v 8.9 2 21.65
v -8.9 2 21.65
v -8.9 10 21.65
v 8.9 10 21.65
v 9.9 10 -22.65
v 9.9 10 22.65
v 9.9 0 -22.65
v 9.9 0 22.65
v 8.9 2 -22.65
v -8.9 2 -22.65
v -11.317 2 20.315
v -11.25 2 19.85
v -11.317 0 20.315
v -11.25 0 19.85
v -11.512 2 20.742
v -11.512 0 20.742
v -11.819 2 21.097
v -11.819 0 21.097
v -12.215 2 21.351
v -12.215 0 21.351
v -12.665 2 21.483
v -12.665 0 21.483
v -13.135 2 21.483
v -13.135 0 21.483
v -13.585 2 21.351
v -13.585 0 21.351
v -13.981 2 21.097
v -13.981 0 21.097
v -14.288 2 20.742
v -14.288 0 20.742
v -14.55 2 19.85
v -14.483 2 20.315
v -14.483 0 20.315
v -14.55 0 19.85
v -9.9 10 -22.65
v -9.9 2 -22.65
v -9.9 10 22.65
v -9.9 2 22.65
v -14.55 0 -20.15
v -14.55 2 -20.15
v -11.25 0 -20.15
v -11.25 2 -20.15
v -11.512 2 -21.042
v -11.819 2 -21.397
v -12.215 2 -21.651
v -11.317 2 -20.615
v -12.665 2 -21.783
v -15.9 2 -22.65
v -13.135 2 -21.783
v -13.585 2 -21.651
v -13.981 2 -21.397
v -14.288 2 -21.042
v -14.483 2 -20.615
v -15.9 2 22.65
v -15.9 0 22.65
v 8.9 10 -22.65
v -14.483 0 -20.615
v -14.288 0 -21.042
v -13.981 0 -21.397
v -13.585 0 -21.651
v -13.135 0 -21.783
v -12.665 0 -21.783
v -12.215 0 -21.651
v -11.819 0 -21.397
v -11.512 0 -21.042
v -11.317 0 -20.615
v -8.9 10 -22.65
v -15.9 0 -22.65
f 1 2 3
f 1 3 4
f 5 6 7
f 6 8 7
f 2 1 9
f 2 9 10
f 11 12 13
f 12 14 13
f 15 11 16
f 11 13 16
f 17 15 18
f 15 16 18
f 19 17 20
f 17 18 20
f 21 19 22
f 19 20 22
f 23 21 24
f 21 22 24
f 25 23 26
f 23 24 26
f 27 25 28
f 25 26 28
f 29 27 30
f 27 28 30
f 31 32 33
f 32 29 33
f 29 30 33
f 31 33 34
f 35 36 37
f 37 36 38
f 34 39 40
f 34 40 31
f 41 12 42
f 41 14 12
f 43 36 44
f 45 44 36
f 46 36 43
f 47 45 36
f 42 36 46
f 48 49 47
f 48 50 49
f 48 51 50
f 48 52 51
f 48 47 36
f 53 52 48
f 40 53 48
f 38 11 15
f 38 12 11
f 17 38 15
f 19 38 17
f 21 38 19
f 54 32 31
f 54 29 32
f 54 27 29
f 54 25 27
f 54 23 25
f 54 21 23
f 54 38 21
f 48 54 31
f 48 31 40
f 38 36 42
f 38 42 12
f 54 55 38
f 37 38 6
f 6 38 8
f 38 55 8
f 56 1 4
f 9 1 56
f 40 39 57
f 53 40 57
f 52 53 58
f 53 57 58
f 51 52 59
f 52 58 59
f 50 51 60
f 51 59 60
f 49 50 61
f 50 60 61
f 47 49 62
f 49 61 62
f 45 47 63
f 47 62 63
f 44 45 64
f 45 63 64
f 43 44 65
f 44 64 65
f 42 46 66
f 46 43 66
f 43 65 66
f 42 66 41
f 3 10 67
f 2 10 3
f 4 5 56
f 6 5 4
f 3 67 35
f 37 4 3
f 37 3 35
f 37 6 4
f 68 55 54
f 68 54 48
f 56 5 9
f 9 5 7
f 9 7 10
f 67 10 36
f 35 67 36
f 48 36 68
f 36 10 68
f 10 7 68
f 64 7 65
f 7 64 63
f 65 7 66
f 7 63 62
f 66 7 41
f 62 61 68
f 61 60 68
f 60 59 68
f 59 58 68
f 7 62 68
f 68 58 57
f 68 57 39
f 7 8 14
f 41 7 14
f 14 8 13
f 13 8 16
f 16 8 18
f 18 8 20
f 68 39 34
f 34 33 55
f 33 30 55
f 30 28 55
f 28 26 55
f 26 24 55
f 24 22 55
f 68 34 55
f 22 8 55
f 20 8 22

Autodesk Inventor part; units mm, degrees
ref_plane "YZ Plane" through (0, 0, 0) normal (1, 0, 0) x (0, 1, 0)
ref_plane "XZ Plane" through (0, 0, 0) normal (0, 1, 0) x (-1, 0, 0)
ref_plane "XY Plane" through (0, 0, 0) normal (0, 0, 1) x (1, 0, 0)
sketch "Sketch1" plane through (0, 0, 0) normal (0, 1, 0) x (-1, 0, 0)
  line L0 (8.9, 21.65) -> (-8.9, 21.65)
  line L1 (-8.9, 21.65) -> (-8.9, -21.65)
  line L2 (-8.9, -21.65) -> (8.9, -21.65)
  line L3 (8.9, -21.65) -> (8.9, 21.65)
  line L4 (8.9, 21.65) -> (-8.9, -21.65) construction
  line L5 (-8.9, 21.65) -> (8.9, -21.65) construction
  line L6 (9.9, 22.65) -> (-9.9, 22.65)
  line L7 (-9.9, 22.65) -> (-9.9, -22.65)
  line L8 (-9.9, -22.65) -> (9.9, -22.65)
  line L9 (9.9, -22.65) -> (9.9, 22.65)
  line L10 (9.9, 22.65) -> (-9.9, -22.65) construction
  line L11 (-9.9, 22.65) -> (9.9, -22.65) construction
  line L12 (9.9, 22.65) -> (15.9, 22.65)
  line L13 (15.9, 22.65) -> (15.9, -22.65)
  line L14 (15.9, -22.65) -> (9.9, -22.65)
  line L15 (9.9, -22.65) -> (9.9, 22.65)
  line L16 (8.9, -21.65) -> (8.9, -22.65)
  line L17 (-8.9, -21.65) -> (-8.9, -22.65)
  line L18 (12.9, 19.85) -> (12.9, -20.15) construction
  line L19 (11.25, 19.85) -> (11.25, -20.15)
  line L20 (14.55, -20.15) -> (14.55, 19.85)
  arc A0 (14.55, 19.85) -> (11.25, 19.85) centre (12.9, 19.85) ccw
  arc A1 (11.25, -20.15) -> (14.55, -20.15) centre (12.9, -20.15) ccw
  point P0 (0, 0)
  point P1 (12.9, -0.15)
  point P2 (12.9, -22.65)
  dimension "d0" = 17.8
  dimension "d1" = 43.3
  dimension "d2" = 19.8
  dimension "d3" = 45.3
  dimension "d4" = 6
  dimension "d5" = 3.3
  dimension "d6" = 40
  dimension "d7" = 2.5
extrude "Extrusion1" add sketch "Sketch1" along normal blind 2 contours L3 L2 L1 L0 | L16 L8 L17 L2 | L9 L12 L13 L14
extrude "Extrusion2" add sketch "Sketch1" along normal blind 10 contours L0 L1 L17 L8 L7 L6 L9 L16 L3
properties part number "Mounting Relay"
